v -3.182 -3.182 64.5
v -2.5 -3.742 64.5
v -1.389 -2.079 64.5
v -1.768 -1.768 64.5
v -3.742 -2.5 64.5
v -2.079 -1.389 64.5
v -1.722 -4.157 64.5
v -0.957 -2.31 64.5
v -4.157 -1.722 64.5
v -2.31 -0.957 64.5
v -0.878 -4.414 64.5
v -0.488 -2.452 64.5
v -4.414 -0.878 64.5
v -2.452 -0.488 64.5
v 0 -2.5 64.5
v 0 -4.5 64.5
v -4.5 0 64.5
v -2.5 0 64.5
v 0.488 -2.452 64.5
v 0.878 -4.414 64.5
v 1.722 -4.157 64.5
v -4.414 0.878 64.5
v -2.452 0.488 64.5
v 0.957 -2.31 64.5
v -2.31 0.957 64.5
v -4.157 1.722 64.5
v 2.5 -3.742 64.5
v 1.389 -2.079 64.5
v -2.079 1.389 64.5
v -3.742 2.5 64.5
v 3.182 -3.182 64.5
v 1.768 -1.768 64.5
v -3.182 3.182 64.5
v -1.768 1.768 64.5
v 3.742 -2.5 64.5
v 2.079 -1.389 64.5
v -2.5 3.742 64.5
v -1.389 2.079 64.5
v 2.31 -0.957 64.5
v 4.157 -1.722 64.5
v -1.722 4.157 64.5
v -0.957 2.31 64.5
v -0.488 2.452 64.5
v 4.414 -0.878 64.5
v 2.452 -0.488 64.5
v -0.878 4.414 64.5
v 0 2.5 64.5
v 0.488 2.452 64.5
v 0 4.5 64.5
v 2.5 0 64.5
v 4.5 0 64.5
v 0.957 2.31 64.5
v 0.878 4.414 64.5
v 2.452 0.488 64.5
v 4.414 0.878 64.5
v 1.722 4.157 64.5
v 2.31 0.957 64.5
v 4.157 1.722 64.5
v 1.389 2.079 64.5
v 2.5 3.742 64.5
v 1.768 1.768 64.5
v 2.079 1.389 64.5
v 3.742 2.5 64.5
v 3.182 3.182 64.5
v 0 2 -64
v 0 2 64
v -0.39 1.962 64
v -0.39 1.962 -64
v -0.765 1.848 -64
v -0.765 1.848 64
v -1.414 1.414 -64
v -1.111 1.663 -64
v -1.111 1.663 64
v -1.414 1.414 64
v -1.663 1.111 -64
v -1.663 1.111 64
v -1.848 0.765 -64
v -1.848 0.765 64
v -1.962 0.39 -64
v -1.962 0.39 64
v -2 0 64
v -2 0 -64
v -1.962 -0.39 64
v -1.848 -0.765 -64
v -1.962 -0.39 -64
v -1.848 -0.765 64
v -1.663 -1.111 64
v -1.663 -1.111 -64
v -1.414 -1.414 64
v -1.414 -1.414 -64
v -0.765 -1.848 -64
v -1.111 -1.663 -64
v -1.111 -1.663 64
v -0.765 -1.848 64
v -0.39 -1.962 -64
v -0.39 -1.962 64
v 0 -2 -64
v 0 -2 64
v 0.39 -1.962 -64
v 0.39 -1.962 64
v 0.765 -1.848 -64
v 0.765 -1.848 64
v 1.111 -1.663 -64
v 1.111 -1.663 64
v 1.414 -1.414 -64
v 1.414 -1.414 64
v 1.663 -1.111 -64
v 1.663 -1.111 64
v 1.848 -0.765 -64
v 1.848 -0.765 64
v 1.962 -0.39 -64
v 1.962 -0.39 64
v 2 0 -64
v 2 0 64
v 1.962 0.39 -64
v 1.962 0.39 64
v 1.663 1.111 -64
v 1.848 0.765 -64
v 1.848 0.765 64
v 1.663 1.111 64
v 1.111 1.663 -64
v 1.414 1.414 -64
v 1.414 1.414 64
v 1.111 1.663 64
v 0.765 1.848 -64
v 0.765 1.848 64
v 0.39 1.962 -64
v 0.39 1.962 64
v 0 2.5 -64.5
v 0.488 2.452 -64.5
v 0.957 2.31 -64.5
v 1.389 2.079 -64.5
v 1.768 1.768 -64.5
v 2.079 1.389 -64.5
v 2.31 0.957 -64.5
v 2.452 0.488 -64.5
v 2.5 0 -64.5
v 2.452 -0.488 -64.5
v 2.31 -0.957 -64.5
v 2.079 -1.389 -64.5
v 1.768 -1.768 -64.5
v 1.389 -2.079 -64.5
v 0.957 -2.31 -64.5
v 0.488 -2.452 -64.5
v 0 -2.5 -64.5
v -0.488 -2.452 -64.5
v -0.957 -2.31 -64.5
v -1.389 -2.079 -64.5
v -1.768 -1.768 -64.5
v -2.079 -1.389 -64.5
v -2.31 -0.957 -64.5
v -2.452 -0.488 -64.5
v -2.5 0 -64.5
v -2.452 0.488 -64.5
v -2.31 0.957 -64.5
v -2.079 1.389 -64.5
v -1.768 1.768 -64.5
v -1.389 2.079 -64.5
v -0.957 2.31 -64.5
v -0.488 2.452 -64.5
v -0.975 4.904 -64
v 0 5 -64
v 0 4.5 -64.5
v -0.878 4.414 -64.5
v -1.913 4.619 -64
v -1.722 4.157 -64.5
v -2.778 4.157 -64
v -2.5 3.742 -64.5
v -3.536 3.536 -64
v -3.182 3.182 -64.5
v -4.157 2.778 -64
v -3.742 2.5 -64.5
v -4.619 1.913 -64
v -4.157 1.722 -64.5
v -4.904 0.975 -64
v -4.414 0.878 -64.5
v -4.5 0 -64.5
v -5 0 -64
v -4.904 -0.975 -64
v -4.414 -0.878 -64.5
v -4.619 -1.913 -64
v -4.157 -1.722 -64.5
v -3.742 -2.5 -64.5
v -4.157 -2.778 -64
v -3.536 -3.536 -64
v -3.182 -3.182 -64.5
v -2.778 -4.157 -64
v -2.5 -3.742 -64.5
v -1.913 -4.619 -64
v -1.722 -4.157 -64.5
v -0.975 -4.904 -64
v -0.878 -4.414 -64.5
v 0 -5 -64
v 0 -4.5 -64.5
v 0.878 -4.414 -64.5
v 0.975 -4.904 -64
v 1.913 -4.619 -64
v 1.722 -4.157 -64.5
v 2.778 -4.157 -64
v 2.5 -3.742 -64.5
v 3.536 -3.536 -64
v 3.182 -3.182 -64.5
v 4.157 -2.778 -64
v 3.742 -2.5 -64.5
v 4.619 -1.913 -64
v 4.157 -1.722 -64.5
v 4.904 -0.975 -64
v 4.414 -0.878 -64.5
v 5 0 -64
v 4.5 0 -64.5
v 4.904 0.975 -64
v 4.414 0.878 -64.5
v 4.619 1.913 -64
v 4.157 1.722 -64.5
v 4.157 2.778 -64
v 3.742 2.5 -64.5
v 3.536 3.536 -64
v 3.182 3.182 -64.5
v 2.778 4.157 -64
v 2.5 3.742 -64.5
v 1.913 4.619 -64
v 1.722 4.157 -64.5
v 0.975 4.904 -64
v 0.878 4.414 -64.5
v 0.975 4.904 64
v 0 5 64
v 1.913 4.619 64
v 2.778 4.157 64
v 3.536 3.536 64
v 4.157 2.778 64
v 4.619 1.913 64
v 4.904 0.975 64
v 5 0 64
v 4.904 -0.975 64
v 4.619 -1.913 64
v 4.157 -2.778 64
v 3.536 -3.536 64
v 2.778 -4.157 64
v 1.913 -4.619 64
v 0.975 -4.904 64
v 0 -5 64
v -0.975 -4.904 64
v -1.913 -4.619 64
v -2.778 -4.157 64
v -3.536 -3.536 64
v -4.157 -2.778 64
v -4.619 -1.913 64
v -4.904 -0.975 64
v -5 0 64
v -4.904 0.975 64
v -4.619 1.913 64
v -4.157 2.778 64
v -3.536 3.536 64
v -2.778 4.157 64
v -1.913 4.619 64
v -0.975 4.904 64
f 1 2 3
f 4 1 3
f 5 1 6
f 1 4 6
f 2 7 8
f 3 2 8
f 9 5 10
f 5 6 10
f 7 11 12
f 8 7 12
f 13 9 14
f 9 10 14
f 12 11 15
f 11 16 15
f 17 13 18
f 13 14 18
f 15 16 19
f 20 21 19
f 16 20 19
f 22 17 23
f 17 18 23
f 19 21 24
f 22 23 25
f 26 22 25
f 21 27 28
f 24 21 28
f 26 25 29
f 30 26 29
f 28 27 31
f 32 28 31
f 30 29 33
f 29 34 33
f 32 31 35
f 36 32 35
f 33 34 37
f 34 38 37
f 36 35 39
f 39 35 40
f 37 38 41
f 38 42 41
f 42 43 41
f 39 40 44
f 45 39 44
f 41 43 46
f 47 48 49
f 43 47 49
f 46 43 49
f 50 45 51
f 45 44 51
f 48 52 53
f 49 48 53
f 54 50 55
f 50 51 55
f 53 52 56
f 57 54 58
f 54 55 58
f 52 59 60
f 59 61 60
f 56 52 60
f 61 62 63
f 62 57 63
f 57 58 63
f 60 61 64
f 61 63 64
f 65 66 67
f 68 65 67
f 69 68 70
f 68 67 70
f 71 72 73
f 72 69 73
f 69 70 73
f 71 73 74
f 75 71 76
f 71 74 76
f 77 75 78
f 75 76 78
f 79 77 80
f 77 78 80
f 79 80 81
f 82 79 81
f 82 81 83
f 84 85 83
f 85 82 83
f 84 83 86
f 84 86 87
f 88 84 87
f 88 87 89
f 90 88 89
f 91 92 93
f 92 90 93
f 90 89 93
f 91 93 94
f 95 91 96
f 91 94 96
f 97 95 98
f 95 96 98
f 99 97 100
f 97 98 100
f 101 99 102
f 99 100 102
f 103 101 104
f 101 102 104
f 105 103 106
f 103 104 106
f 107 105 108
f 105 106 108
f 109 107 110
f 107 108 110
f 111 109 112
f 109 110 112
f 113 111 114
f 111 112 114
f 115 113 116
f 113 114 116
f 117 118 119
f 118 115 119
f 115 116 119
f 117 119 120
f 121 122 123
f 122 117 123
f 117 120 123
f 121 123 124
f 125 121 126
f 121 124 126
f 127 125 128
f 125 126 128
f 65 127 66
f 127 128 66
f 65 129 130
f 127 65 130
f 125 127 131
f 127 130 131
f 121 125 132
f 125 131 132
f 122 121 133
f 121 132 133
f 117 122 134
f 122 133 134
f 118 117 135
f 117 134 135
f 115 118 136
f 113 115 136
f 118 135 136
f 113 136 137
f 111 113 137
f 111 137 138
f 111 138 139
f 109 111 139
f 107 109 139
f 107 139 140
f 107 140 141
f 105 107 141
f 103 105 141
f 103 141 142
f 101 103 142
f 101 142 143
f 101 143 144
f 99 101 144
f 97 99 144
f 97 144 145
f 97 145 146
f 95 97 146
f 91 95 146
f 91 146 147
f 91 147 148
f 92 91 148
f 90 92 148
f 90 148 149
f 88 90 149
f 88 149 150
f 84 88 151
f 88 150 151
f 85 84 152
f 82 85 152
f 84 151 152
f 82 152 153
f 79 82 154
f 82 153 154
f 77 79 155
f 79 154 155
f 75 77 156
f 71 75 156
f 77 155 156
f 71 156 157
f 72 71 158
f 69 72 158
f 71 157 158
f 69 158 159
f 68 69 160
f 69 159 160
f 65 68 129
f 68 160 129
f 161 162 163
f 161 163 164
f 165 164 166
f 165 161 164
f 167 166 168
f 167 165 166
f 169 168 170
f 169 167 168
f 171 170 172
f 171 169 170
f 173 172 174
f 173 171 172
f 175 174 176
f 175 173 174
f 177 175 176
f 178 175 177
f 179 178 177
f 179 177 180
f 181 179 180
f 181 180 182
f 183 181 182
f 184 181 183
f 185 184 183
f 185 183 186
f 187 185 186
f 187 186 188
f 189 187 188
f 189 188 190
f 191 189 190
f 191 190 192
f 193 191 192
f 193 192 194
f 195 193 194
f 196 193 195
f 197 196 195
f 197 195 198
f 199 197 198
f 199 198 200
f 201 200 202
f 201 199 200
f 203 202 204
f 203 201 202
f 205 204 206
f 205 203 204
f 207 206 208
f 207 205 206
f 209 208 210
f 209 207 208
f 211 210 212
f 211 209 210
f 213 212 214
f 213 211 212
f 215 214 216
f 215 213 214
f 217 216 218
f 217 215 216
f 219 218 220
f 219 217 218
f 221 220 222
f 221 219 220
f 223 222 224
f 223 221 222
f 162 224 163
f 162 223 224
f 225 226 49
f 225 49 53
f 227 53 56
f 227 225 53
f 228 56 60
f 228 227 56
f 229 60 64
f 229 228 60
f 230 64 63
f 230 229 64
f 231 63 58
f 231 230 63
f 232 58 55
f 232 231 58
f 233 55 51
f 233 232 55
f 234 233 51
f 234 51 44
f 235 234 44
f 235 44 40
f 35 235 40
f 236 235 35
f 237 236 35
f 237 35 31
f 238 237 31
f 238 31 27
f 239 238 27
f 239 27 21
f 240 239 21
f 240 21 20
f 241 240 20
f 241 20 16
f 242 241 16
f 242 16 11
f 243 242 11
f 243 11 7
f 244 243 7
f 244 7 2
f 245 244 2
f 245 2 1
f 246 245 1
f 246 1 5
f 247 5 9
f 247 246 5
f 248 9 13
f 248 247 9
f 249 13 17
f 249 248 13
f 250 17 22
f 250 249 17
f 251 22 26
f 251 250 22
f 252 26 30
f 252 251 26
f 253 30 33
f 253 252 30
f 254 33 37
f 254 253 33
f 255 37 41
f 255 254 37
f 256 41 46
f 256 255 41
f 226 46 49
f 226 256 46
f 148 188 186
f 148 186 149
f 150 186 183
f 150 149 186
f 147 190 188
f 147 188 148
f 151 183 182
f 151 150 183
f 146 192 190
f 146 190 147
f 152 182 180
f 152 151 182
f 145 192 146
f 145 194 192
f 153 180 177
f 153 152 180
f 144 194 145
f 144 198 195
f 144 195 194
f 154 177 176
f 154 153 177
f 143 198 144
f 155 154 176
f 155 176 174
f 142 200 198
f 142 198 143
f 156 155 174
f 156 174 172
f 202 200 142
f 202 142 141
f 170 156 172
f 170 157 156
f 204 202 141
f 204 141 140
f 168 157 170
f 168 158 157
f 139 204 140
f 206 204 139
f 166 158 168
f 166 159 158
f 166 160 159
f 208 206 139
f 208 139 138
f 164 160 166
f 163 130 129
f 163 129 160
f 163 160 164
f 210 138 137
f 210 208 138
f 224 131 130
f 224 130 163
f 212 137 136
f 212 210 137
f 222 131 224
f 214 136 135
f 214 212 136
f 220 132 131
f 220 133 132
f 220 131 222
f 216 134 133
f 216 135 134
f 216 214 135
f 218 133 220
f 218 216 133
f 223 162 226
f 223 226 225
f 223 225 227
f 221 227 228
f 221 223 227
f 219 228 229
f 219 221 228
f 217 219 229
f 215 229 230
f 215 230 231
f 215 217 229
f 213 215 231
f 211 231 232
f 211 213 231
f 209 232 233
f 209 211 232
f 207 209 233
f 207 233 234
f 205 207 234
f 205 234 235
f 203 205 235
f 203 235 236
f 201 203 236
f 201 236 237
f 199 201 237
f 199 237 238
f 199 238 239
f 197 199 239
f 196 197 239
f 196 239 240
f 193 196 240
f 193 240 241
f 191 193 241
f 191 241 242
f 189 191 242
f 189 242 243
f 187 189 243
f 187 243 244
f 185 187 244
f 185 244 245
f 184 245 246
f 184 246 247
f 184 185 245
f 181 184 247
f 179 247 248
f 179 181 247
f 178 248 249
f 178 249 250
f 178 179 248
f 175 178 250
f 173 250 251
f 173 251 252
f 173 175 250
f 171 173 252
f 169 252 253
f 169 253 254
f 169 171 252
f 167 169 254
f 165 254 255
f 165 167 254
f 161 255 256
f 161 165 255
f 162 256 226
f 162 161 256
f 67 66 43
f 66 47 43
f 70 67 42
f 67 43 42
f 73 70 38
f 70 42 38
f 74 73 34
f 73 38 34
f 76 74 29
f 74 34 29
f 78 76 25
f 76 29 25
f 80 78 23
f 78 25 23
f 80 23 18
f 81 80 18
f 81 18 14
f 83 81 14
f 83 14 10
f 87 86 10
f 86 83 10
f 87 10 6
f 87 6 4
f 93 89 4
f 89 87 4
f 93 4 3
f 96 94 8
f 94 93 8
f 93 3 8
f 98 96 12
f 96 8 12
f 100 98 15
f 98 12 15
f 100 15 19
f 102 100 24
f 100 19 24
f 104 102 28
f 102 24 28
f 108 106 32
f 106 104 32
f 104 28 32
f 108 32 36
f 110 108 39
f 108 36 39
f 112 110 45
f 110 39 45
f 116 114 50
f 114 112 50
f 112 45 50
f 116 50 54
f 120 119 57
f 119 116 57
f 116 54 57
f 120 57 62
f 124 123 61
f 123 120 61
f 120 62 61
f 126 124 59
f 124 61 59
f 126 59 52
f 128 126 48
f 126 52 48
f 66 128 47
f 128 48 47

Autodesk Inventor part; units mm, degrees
ref_plane "YZ Plane" through (0, 0, 0) normal (1, 0, 0) x (0, 1, 0)
ref_plane "XZ Plane" through (0, 0, 0) normal (0, 1, 0) x (-1, 0, 0)
ref_plane "XY Plane" through (0, 0, 0) normal (0, 0, 1) x (1, 0, 0)
sketch "Boceto1" plane through (0, 0, 0) normal (1, 0, 0) x (0, 1, 0)
  line L0 (0, 64.5) -> (0, -64.5)
  line L1 (2, 64.5) -> (5, 64.5)
  line L2 (5, 64.5) -> (5, -64.5)
  line L3 (5, -64.5) -> (2, -64.5)
  line L4 (2, -64.5) -> (2, 64.5)
  point P0 (0, 0)
  point P1 (0, 0)
  dimension "d0" = 129
  dimension "d1" = 10
  dimension "d3" = 3
revolve "Revolución1" add sketch "Boceto1" angle 360 about axis through (0, 0, 64.5) along (0, 0, -1)
thread "Rosca1" size "M10x1.5" class "6g" standard "ANSI Metric M Profile" full length
chamfer "Chaflán1" distance 0.5 angle 45 4 edges at (0, -2, 64.5) (0, -5, 64.5) (0, -5, -64.5) (0, -2, -64.5)
properties part number "eje manzana"
